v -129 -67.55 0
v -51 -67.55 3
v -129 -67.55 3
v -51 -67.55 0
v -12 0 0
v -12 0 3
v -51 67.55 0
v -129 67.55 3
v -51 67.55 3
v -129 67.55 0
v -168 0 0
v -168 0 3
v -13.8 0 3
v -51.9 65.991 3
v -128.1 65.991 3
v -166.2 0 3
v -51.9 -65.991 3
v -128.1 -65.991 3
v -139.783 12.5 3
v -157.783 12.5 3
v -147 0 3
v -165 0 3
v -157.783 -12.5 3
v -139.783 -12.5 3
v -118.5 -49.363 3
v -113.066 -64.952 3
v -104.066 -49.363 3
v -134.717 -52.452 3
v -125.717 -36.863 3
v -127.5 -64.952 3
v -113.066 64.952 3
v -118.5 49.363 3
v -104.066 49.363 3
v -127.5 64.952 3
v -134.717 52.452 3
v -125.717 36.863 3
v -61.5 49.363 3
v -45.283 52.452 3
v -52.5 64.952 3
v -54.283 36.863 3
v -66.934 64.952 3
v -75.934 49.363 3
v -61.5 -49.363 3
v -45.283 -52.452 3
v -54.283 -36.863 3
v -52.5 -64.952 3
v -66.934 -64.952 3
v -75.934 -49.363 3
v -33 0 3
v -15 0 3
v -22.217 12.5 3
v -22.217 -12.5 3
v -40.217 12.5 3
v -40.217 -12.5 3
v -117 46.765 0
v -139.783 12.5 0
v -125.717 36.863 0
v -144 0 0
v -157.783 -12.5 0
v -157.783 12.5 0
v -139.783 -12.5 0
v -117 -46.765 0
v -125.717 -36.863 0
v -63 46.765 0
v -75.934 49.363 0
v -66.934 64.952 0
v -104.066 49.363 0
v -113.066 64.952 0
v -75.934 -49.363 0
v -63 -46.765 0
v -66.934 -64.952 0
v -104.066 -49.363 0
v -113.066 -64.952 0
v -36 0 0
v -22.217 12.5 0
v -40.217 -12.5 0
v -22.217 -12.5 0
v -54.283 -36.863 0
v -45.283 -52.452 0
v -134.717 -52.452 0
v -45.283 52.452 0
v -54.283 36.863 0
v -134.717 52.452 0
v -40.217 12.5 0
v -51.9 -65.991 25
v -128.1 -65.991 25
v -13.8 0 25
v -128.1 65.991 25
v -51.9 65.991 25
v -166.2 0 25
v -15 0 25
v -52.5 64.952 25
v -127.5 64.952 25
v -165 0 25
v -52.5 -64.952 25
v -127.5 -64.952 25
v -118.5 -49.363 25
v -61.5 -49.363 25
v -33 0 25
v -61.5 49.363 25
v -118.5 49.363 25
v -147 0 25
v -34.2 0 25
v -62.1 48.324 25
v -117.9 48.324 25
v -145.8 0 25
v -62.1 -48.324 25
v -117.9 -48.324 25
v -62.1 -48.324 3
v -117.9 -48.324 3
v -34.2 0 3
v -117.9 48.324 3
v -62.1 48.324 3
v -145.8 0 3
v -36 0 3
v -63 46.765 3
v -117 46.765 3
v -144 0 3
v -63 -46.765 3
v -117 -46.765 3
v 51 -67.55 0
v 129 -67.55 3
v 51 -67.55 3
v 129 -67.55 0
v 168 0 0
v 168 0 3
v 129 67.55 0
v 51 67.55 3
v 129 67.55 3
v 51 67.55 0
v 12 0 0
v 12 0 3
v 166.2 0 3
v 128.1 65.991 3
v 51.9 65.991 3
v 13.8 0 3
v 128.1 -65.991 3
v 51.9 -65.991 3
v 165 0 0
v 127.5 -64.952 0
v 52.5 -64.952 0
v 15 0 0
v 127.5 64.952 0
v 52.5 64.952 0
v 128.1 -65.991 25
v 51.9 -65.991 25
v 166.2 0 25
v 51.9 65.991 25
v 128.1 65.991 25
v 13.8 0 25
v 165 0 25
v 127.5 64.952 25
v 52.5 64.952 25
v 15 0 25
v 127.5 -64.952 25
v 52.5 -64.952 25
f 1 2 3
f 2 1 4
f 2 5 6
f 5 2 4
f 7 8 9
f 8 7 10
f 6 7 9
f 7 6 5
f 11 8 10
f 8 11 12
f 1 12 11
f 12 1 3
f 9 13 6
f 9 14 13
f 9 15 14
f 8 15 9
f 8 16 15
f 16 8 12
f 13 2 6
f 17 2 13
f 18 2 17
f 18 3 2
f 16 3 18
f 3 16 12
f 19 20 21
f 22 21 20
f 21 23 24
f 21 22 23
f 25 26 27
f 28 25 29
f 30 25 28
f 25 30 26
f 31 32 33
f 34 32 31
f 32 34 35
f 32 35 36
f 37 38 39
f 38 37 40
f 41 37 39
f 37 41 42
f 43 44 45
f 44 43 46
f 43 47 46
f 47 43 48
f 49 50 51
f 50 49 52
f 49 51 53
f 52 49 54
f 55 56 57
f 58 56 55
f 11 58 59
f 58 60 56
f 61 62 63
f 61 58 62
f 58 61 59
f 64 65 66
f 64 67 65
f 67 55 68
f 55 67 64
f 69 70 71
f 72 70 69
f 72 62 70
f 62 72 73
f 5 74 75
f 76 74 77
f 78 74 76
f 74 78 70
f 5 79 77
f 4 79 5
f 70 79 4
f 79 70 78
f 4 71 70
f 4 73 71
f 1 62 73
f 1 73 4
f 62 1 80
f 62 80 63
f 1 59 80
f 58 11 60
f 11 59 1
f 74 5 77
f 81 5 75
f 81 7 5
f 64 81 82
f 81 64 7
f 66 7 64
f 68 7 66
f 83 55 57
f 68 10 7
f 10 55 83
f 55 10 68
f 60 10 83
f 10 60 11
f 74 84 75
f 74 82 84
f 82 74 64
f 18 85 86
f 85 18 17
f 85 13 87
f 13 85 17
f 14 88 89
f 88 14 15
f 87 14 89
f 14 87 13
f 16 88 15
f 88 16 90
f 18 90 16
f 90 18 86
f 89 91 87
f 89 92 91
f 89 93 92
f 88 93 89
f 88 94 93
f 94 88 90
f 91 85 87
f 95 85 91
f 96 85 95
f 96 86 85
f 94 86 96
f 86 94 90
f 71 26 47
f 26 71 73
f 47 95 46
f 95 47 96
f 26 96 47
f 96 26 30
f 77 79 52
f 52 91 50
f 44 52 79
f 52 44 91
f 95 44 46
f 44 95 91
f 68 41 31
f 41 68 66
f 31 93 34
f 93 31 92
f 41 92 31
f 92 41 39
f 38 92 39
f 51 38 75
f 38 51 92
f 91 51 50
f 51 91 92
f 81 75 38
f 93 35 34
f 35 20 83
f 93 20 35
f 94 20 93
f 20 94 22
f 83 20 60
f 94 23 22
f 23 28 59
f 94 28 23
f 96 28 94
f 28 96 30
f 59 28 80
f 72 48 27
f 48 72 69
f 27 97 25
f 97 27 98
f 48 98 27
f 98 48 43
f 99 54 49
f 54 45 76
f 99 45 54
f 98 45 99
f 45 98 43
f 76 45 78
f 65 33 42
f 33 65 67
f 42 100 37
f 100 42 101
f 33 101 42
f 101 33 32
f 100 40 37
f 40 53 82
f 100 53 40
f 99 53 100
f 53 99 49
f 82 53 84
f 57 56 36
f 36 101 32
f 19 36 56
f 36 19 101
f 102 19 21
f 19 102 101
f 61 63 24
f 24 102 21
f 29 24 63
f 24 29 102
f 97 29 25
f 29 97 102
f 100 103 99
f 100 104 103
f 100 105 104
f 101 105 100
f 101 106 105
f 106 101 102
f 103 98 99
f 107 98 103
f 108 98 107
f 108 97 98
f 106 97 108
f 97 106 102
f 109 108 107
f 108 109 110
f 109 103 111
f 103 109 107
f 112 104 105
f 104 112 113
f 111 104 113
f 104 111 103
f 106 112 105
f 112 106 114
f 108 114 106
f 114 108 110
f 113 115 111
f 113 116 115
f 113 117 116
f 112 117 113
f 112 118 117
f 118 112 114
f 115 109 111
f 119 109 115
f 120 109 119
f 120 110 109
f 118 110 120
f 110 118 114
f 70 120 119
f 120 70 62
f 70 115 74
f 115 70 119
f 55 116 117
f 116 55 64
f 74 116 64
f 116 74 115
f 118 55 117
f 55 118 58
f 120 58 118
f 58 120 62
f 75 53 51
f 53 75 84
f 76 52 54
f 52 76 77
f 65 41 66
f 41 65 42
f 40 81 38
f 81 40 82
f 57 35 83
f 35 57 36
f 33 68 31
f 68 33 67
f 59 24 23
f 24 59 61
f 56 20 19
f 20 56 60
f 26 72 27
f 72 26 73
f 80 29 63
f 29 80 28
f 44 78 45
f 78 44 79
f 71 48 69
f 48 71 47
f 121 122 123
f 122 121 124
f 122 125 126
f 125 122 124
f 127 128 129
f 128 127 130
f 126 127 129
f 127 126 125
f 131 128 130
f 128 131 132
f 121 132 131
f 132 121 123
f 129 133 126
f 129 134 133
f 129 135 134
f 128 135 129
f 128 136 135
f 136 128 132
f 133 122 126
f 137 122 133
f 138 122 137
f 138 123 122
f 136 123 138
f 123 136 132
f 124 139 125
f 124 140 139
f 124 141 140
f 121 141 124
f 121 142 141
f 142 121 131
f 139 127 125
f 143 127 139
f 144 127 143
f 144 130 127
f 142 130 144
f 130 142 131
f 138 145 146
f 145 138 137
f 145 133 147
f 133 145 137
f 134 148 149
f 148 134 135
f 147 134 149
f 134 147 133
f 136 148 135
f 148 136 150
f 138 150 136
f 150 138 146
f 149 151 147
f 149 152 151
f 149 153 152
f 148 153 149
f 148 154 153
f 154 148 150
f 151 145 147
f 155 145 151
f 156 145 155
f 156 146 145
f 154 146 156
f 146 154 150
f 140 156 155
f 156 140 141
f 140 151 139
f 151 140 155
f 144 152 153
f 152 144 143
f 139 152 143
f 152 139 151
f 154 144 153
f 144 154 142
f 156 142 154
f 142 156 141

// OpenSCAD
// Customisable pastry cutter for
// blank shape and Vol-au-vent wall
// 
// Options are circular, oval, polygonal (regular only) or rectangle
// square can be made by 4 sided polygon or rectangle with X=Y
//
// By misterC @ thingiverse

// CUSTOMIZER VARIABLES
/* [Basic choices] */
// Do you want a regular polygon, a circle, square/rectangle or an oval?
shape_choice = "Polygon";	// [Circle:Circular,Oval:Oval,Polygon:Regular polygon (3 to 12 sides),Rectangle:Rectangular]
//
// What width of Vol-au-Vent wall?
vol_wall = 18;			// [10:0.5:25]
// What depth of cutter?
cutter_depth = 25;		// [10,15,20,25,30]
// What wall thickness? (base this on your nozzle diameter)
cutter_wall = 1.2;		// [0.6,0.8,1.0,1.2,1.4,1.6,1.8,2]
// Top lip size?
lip_dim = 3;			// [3:6]
//
//Which cutter to show in preview
part ="both";	// [top:Upper cutter,base:Lower cutter,both:Both cutters]

/* [Circular cutter options] */
// What diamater should the cutter shape be?
circ_dia=75;		// [40:5:150]

/* [Oval cutter options] */
// What overall width should the cutter shape be?
pill_len = 150;		// [50:5:200]
// What diameter should the ends of the cutter be?
pill_dia = 90;		// [20:5:200]

/* [Polygon cutter options] */
// How many faces do you want?
poly_faces = 6;		// [3:12]
// and what length should each side be?
poly_side = 75;		// [50:5:150]

/* [Rectangular cutter options]*/
// What width should the cutter shape be?
rect_wide = 100;		// [40:5:160]
// What height should the cutter shape be?
rect_high = 75;			// [40:5:160]


// PROGRAM VARIABLES AFTER THIS POINT
/* [Hidden] */
// Calculated values
// centres & half_centre are the eccentricity dims for ovals, so can be zero for non ovals
centres = (shape_choice=="Oval") ?	pill_len - pill_dia : 0;
half_centre = (shape_choice=="Oval") ? centres/2 : 0;
out_rad = (shape_choice=="Circle") ? circ_dia/2 
		: (shape_choice=="Oval") ? pill_dia/2 
		: (shape_choice=="Polygon") ? poly_side/(2*sin(180/poly_faces)) 
		: 0;
in_rad = out_rad - vol_wall;
// offset dimension for showing both pieces
both_off = (shape_choice=="Circle" || shape_choice=="Polygon") ? 1.2*out_rad 
		: (shape_choice=="Oval") ? 0.6*pill_len 
		: 0.75*rect_wide;

// Shape values matrix (X,Y for rectangular otherwise radius)
shape_set = (shape_choice=="Rectangle") ? [
		[rect_wide,	rect_high],
		[rect_wide-2*vol_wall,	rect_high-2*vol_wall],
		[rect_wide+2*cutter_wall,	rect_high+2*cutter_wall],
		[rect_wide-2*(vol_wall+cutter_wall),	rect_high-2*(vol_wall+cutter_wall)],
		[rect_wide+2*lip_dim,	rect_high+2*lip_dim],
		[rect_wide-2*(vol_wall+lip_dim),	rect_high-2*(vol_wall+lip_dim)]		
		] : [
		out_rad,
		in_rad,
		out_rad + cutter_wall,
		in_rad - cutter_wall,
		out_rad + lip_dim,
		in_rad - lip_dim
		];

// how many grips will we put onto cutter sides (or round a cutter radius)
// x & y for rectangle sides, c around curve of circular, o for straight of oval
// polygons get grips at corners, so we only need to know the angle
x_grip = (shape_choice=="Rectangle") ? get_a_grip(shape_set[1].x,2.3) : 0;
y_grip = (shape_choice=="Rectangle") ? get_a_grip(shape_set[1].y,2.3) : 0;
c_grip = (shape_choice=="Circle") ? get_a_grip(shape_set[1]*2*PI,4)
		: (shape_choice=="Oval") ? get_a_grip(shape_set[1]*PI,3) : 0;
c_ang = (shape_choice=="Circle") ? 360/c_grip
		: (shape_choice=="Oval") ? 180/c_grip : 0;
o_grip = (shape_choice=="Oval") ? get_a_grip(centres,3) : 0;
p_ang = (shape_choice=="Polygon") ? 360/poly_faces : 0;

$fn = (shape_choice=="Polygon") ? poly_faces : 60;		// Cheat at doing polygon, otherside reasonably smooth curves
fudge = 1;		// small offset to assist with difference() volumes

// PROGRAM - process which part(s) to show and call the necessary module(s)

if (part == "top")
{
	if (shape_choice=="Rectangle") rect_top();
	else top();
}
else if (part == "base")
{
	if (shape_choice=="Rectangle") rect_base();
	else base();
}
else
{
	translate([-both_off,0,0])
	{
		if (shape_choice=="Rectangle") rect_top();
		else top();
	}
	translate([both_off,0,0])
	{
		if (shape_choice=="Rectangle") rect_base();
		else base();
	}
}

// MODULES AND FUNCTIONS

module top()
{
	// outside shape, bulb facing out
	base();
	// inside shape, bulb facing in
	difference()
	{
		shape(1,cutter_depth);	// cutter body

		translate([0,0,-fudge]) shape(3,cutter_depth+2*fudge);	// inner shape
	}
	difference()
	{
		shape(1,lip_dim);		// bulb at top faces in

		translate([0,0,-fudge]) shape(5,lip_dim+2*fudge);
	}
	// grips between inner and outer shapes
	intersection()
	{
		difference()	// "donut" of top lip
		{
			shape(4,lip_dim);

			translate([0,0,-fudge]) shape(1,lip_dim+2*fudge);
		}

		translate([0,0,lip_dim/2]) union()		// all the webs
		{
			if (shape_choice=="Circle") for (ang=[0:c_ang:360]) poly_grip(ang,vol_wall);
			else if (shape_choice=="Polygon") for (ang=[0:p_ang:360]) poly_grip(ang,poly_side/3);		// big grip at corners
			else	// only oval left
			{
				translate([half_centre,0,0]) for (ang=[-90+c_ang:c_ang:90-c_ang]) poly_grip(ang,vol_wall);		// first curve
				translate([-half_centre,0,0]) for (ang=[90+c_ang:c_ang:270-c_ang]) poly_grip(ang,vol_wall);		// last curve
				rect_grips(0,o_grip,shape_set[4],centres);		// straights are like rectangle long side
			}
		}
	}
}

module base()
{
	difference()
	{
		union()
		{
			shape(4,lip_dim);			// bulb at top faces out
			shape(2,cutter_depth);	// cutter body
		}

		translate([0,0,-fudge]) shape(0,cutter_depth+2*fudge);	// inner shape
	}
}

module shape(num,depth)
{
	if (shape_choice=="Oval")
	{
		for (end=[-half_centre,half_centre]) translate([end,0,0]) cylinder(r=shape_set[num],h=depth);
		translate([-half_centre,-shape_set[num],0]) cube([centres,shape_set[num]*2,depth]);
	}
	else cylinder(r=shape_set[num],h=depth);
}

module poly_grip(rot_ang,what_grip)
{
	rotate(rot_ang) translate([shape_set[1],0,0]) cube([3*vol_wall,what_grip,lip_dim],center=true);
}

module rect_top()
{
	// outside shape, bulb facing out
	rect_base();
	// inside shape, bulb facing in
	difference()
	{
		rect_shape(1,cutter_depth,0);		// cutter body

		rect_shape(3,cutter_depth,2*fudge);	// inner shape
	}
	difference()
	{
		rect_shape(1,lip_dim,0);			// bulb at top faces in

		rect_shape(5,lip_dim,2*fudge);
	}
	// grips between inner and outer shapes
	intersection()
	{
		difference()	// "donut" of top lip
		{
			rect_shape(4,lip_dim,0);

			rect_shape(1,lip_dim,2*fudge);
		}

		translate([0,0,lip_dim/2]) union()		// all the webs
		{
			rect_grips(0,x_grip,shape_set[4].y,shape_set[1].x);
			rect_grips(90,y_grip,shape_set[4].x,shape_set[1].y);
		}
	}
}

module rect_base()
{
	difference()
	{
		union()
		{
			rect_shape(4,lip_dim,0);		// bulb at top faces out
			rect_shape(2,cutter_depth,0);	// cutter body
		}

		rect_shape(0,cutter_depth,2*fudge);	// inner shape
	}
}

module rect_shape(num,height,is_fudged)
{
	translate([0,0,height/2]) cube([shape_set[num].x,shape_set[num].y,height+is_fudged],center=true);
}

module rect_grips(rot_ang,what_grip,grip_high,length)
{
	rotate(rot_ang)
		if (what_grip==1) cube([vol_wall,2*grip_high,lip_dim],center=true);
		else
		{
			grip_gap = (length-(vol_wall*what_grip))/(what_grip-1);
			for (grip=[0:what_grip-1])
				translate([(grip*(grip_gap+vol_wall))+(vol_wall-length)/2,0,0]) cube([vol_wall,2*grip_high,lip_dim],center=true);
		}
}

function get_a_grip(length,multiple)	// returns an integer based on vol_wall and the length to support
= round(length/(multiple*vol_wall));
